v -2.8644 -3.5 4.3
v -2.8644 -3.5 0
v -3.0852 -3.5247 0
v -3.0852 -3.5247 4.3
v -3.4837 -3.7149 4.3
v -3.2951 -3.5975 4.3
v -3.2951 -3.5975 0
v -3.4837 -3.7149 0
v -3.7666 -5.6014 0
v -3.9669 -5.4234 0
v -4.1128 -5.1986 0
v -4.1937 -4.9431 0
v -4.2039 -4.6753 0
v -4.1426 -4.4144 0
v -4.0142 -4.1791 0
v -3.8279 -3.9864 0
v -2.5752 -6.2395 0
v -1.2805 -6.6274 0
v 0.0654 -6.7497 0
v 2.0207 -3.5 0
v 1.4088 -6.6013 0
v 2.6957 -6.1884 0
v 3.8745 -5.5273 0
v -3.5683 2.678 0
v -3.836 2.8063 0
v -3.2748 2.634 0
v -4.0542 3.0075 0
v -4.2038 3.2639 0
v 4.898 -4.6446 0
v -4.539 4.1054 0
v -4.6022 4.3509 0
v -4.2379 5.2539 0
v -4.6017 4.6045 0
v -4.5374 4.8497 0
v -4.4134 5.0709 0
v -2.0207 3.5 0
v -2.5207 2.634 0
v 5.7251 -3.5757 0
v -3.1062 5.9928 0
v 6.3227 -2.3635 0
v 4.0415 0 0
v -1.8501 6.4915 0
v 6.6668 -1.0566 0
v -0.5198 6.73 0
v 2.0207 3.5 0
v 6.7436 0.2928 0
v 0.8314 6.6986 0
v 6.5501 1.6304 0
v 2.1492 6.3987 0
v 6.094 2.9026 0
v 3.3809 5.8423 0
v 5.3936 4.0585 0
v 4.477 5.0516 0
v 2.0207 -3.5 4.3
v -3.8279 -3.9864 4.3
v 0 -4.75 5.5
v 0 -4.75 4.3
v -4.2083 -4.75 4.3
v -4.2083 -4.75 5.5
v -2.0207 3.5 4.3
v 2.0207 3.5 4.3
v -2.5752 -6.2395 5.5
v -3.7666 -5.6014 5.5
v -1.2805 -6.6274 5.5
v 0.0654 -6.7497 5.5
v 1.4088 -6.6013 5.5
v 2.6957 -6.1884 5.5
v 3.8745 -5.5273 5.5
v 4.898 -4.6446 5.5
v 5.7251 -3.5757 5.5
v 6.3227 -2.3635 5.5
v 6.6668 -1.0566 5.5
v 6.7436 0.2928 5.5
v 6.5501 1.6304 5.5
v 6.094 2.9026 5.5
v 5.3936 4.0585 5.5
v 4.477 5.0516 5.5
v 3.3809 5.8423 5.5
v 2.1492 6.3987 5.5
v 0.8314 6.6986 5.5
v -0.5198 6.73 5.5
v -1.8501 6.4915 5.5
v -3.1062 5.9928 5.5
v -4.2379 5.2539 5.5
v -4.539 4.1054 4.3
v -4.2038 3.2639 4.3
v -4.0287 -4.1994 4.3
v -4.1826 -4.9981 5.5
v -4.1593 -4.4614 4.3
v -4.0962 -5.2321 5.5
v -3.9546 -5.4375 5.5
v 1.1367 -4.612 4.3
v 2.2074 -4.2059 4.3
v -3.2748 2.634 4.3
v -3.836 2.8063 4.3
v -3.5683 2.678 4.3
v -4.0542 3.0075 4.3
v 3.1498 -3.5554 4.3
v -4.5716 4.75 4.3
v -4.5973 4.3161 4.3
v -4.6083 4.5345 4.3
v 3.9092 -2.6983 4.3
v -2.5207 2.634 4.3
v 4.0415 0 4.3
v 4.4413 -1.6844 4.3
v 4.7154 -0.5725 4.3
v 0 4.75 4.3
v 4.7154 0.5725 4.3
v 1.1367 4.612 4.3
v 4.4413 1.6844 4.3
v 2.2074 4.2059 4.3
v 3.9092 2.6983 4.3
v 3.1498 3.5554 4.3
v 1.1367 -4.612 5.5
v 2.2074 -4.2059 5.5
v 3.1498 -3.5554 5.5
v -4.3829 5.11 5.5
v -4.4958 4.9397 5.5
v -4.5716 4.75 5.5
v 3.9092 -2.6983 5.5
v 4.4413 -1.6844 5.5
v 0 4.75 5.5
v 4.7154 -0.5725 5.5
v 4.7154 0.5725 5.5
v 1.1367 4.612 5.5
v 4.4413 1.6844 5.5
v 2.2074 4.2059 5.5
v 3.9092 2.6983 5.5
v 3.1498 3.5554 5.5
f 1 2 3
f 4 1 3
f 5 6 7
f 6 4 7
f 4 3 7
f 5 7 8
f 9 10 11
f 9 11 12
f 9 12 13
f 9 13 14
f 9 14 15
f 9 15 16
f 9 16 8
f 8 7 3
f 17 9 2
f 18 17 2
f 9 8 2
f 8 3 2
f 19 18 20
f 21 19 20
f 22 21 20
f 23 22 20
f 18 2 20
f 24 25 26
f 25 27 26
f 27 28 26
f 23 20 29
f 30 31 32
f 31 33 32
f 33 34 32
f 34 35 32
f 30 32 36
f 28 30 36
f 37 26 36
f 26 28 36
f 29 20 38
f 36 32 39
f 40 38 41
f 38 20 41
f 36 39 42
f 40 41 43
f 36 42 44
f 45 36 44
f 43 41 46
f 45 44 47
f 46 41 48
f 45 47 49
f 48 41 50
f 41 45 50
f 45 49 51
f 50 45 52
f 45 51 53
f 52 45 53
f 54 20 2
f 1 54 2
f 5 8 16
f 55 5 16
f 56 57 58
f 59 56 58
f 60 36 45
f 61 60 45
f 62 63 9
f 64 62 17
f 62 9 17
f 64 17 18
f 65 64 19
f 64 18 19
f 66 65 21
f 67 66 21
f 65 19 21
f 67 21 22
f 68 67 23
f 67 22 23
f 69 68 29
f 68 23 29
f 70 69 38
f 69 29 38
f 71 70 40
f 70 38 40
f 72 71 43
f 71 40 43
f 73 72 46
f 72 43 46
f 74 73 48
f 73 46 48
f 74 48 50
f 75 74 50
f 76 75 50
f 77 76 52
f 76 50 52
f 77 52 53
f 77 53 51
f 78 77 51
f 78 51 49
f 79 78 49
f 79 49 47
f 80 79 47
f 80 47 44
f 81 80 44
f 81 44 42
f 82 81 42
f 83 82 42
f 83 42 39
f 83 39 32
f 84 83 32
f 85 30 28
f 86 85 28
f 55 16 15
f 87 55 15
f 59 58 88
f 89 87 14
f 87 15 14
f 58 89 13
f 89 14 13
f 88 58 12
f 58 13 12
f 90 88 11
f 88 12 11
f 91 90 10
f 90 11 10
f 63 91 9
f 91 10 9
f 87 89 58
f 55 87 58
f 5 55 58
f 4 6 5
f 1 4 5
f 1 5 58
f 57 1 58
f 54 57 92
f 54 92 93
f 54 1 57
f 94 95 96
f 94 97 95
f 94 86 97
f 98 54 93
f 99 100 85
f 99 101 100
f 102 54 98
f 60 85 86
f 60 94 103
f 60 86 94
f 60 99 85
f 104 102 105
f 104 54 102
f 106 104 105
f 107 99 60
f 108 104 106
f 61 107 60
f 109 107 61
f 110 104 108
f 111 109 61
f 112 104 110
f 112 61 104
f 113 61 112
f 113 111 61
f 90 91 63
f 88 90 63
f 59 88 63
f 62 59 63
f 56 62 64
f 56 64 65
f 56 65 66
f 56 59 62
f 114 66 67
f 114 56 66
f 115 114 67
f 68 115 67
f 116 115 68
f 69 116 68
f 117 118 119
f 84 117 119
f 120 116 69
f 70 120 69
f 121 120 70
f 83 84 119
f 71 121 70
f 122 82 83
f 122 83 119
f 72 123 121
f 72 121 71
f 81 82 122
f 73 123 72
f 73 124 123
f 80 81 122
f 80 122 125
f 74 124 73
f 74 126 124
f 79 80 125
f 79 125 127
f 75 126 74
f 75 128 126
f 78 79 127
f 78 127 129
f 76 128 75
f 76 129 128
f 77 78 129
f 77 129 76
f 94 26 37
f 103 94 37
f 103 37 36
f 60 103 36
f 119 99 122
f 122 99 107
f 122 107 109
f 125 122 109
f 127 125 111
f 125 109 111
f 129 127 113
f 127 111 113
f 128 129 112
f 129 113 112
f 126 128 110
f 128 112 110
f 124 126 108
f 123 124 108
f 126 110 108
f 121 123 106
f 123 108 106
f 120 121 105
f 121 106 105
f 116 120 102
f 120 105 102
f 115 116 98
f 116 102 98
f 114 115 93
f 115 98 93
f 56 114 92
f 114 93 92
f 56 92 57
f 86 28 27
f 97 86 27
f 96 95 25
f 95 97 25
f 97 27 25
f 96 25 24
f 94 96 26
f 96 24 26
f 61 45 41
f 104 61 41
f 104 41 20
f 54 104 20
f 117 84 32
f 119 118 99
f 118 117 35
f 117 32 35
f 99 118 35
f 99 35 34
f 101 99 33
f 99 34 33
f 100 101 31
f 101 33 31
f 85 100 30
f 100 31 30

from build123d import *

# Parameters (mm, degrees)
BOSS_EXTRUDE1_DEPTH = 4.3
BOSS_EXTRUDE4_DEPTH = 5.5
FILLET4_R           = 1


with BuildPart() as part:
    # Sketch1 → Boss-Extrude1 (new body)
    with BuildSketch(Plane.XY):
        with BuildLine():
            Line((-2.020725942, -3.5), (-3.211308145, -3.5))
            ThreePointArc((-3.211308145, -3.5), (4.715670166, 0.570048145), (-3.952806323, 2.633974596))
            Line((-3.952806323, 2.633974596), (-2.520725942, 2.633974596))
            Line((-2.520725942, 2.633974596), (-2.020725942, 3.5))
            Line((-2.020725942, 3.5), (2.020725942, 3.5))
            Line((2.020725942, 3.5), (4.041451884, 0))
            Line((4.041451884, 0), (2.020725942, -3.5))
            Line((2.020725942, -3.5), (-2.020725942, -3.5))
        make_face()
        with BuildLine():
            Line((-4.795831523, 4.75), (-3.952806323, 2.633974596))
            ThreePointArc((-3.952806323, 2.633974596), (-2.241776156, 4.18771294), (0, 4.75))
            Line((0, 4.75), (-4.795831523, 4.75))
        make_face()
        with BuildLine():
            Line((-3.211308145, -3.5), (-4.795831523, -4.75))
            Line((-4.795831523, -4.75), (0, -4.75))
            ThreePointArc((0, -4.75), (-1.723006094, -4.426482802), (-3.211308145, -3.5))
        make_face()
    extrude(amount=BOSS_EXTRUDE1_DEPTH)

    # Sketch1<6> → Boss-Extrude4 (add)
    with BuildSketch(Plane.XY):
        with BuildLine():
            ThreePointArc((-4.795831523, -4.75), (6.75, 0), (-4.795831523, 4.75))
            Line((-4.795831523, 4.75), (0, 4.75))
            ThreePointArc((0, 4.75), (4.75, 0), (0, -4.75))
            Line((0, -4.75), (-4.795831523, -4.75))
        make_face()
    extrude(amount=BOSS_EXTRUDE4_DEPTH)

    # Fillet4
    # the kernel refuses this fillet: 1 mm, written as the material it takes off along each edge
    with BuildSketch(Plane(origin=(-4.795831523, -4.75, -3.339360347), x_dir=(0.7851091148875305, 0.6193574716757022, 0), z_dir=(0, 0, 1))) as fillet4_piece_1:
        with BuildLine():
            CenterArc((1.232836015, -1), FILLET4_R, 90, 107.81241463)
            ThreePointArc((0.280772882, -1.305901602), (0.108004206, -0.659913081), (0, 0))
            Line((0, 0), (1.232836015, 0))
        make_face()
    extrude(amount=10.978720693, mode=Mode.SUBTRACT)
    with BuildSketch(Plane(origin=(-3.211308145, -3.5, -0.867394417), x_dir=(1, 0, 0), z_dir=(0, 0, 1))) as fillet4_piece_2:
        with BuildLine():
            CenterArc((FILLET4_R * 0.346957766621, -FILLET4_R), FILLET4_R, 90, 38.269228819)
            Line((-FILLET4_R * 0.272399705055, -FILLET4_R * 0.214890885112), (0, 0))
            Line((0, 0), (FILLET4_R * 0.346957766621, 0))
        make_face()
    extrude(amount=6.034788833, mode=Mode.SUBTRACT)
    with BuildSketch(Plane(origin=(-3.952806323, 2.633974596, -1.695098898), x_dir=(-0.37010921689998283, 0.9289882494228232, 0), z_dir=(0, 0, 1))) as fillet4_piece_3:
        with BuildLine():
            CenterArc((FILLET4_R * 0.678039559156, -FILLET4_R), FILLET4_R, 90, 68.277646872)
            Line((-FILLET4_R * 0.250948690267, -FILLET4_R * 0.6298907831), (0, 0))
            Line((0, 0), (FILLET4_R * 0.678039559156, 0))
        make_face()
    extrude(amount=7.690197796, mode=Mode.SUBTRACT)
    with BuildSketch(Plane(origin=(-4.795831523, 4.75, -1.879489211), x_dir=(0.7421780572784941, 0.6702027538695439, 0), z_dir=(0, 0, 1))) as fillet4_piece_4:
        with BuildLine():
            CenterArc((0.696107115, -0.998448188), FILLET4_R, 86.807628526, 72.832009231)
            Line((-0.241415796, -0.650524644), (0, 0))
            ThreePointArc((0, 0), (0.375897842, 0.010474734), (0.751795684, 0))
        make_face()
    extrude(amount=8.058978421, mode=Mode.SUBTRACT)


solid = part.part
